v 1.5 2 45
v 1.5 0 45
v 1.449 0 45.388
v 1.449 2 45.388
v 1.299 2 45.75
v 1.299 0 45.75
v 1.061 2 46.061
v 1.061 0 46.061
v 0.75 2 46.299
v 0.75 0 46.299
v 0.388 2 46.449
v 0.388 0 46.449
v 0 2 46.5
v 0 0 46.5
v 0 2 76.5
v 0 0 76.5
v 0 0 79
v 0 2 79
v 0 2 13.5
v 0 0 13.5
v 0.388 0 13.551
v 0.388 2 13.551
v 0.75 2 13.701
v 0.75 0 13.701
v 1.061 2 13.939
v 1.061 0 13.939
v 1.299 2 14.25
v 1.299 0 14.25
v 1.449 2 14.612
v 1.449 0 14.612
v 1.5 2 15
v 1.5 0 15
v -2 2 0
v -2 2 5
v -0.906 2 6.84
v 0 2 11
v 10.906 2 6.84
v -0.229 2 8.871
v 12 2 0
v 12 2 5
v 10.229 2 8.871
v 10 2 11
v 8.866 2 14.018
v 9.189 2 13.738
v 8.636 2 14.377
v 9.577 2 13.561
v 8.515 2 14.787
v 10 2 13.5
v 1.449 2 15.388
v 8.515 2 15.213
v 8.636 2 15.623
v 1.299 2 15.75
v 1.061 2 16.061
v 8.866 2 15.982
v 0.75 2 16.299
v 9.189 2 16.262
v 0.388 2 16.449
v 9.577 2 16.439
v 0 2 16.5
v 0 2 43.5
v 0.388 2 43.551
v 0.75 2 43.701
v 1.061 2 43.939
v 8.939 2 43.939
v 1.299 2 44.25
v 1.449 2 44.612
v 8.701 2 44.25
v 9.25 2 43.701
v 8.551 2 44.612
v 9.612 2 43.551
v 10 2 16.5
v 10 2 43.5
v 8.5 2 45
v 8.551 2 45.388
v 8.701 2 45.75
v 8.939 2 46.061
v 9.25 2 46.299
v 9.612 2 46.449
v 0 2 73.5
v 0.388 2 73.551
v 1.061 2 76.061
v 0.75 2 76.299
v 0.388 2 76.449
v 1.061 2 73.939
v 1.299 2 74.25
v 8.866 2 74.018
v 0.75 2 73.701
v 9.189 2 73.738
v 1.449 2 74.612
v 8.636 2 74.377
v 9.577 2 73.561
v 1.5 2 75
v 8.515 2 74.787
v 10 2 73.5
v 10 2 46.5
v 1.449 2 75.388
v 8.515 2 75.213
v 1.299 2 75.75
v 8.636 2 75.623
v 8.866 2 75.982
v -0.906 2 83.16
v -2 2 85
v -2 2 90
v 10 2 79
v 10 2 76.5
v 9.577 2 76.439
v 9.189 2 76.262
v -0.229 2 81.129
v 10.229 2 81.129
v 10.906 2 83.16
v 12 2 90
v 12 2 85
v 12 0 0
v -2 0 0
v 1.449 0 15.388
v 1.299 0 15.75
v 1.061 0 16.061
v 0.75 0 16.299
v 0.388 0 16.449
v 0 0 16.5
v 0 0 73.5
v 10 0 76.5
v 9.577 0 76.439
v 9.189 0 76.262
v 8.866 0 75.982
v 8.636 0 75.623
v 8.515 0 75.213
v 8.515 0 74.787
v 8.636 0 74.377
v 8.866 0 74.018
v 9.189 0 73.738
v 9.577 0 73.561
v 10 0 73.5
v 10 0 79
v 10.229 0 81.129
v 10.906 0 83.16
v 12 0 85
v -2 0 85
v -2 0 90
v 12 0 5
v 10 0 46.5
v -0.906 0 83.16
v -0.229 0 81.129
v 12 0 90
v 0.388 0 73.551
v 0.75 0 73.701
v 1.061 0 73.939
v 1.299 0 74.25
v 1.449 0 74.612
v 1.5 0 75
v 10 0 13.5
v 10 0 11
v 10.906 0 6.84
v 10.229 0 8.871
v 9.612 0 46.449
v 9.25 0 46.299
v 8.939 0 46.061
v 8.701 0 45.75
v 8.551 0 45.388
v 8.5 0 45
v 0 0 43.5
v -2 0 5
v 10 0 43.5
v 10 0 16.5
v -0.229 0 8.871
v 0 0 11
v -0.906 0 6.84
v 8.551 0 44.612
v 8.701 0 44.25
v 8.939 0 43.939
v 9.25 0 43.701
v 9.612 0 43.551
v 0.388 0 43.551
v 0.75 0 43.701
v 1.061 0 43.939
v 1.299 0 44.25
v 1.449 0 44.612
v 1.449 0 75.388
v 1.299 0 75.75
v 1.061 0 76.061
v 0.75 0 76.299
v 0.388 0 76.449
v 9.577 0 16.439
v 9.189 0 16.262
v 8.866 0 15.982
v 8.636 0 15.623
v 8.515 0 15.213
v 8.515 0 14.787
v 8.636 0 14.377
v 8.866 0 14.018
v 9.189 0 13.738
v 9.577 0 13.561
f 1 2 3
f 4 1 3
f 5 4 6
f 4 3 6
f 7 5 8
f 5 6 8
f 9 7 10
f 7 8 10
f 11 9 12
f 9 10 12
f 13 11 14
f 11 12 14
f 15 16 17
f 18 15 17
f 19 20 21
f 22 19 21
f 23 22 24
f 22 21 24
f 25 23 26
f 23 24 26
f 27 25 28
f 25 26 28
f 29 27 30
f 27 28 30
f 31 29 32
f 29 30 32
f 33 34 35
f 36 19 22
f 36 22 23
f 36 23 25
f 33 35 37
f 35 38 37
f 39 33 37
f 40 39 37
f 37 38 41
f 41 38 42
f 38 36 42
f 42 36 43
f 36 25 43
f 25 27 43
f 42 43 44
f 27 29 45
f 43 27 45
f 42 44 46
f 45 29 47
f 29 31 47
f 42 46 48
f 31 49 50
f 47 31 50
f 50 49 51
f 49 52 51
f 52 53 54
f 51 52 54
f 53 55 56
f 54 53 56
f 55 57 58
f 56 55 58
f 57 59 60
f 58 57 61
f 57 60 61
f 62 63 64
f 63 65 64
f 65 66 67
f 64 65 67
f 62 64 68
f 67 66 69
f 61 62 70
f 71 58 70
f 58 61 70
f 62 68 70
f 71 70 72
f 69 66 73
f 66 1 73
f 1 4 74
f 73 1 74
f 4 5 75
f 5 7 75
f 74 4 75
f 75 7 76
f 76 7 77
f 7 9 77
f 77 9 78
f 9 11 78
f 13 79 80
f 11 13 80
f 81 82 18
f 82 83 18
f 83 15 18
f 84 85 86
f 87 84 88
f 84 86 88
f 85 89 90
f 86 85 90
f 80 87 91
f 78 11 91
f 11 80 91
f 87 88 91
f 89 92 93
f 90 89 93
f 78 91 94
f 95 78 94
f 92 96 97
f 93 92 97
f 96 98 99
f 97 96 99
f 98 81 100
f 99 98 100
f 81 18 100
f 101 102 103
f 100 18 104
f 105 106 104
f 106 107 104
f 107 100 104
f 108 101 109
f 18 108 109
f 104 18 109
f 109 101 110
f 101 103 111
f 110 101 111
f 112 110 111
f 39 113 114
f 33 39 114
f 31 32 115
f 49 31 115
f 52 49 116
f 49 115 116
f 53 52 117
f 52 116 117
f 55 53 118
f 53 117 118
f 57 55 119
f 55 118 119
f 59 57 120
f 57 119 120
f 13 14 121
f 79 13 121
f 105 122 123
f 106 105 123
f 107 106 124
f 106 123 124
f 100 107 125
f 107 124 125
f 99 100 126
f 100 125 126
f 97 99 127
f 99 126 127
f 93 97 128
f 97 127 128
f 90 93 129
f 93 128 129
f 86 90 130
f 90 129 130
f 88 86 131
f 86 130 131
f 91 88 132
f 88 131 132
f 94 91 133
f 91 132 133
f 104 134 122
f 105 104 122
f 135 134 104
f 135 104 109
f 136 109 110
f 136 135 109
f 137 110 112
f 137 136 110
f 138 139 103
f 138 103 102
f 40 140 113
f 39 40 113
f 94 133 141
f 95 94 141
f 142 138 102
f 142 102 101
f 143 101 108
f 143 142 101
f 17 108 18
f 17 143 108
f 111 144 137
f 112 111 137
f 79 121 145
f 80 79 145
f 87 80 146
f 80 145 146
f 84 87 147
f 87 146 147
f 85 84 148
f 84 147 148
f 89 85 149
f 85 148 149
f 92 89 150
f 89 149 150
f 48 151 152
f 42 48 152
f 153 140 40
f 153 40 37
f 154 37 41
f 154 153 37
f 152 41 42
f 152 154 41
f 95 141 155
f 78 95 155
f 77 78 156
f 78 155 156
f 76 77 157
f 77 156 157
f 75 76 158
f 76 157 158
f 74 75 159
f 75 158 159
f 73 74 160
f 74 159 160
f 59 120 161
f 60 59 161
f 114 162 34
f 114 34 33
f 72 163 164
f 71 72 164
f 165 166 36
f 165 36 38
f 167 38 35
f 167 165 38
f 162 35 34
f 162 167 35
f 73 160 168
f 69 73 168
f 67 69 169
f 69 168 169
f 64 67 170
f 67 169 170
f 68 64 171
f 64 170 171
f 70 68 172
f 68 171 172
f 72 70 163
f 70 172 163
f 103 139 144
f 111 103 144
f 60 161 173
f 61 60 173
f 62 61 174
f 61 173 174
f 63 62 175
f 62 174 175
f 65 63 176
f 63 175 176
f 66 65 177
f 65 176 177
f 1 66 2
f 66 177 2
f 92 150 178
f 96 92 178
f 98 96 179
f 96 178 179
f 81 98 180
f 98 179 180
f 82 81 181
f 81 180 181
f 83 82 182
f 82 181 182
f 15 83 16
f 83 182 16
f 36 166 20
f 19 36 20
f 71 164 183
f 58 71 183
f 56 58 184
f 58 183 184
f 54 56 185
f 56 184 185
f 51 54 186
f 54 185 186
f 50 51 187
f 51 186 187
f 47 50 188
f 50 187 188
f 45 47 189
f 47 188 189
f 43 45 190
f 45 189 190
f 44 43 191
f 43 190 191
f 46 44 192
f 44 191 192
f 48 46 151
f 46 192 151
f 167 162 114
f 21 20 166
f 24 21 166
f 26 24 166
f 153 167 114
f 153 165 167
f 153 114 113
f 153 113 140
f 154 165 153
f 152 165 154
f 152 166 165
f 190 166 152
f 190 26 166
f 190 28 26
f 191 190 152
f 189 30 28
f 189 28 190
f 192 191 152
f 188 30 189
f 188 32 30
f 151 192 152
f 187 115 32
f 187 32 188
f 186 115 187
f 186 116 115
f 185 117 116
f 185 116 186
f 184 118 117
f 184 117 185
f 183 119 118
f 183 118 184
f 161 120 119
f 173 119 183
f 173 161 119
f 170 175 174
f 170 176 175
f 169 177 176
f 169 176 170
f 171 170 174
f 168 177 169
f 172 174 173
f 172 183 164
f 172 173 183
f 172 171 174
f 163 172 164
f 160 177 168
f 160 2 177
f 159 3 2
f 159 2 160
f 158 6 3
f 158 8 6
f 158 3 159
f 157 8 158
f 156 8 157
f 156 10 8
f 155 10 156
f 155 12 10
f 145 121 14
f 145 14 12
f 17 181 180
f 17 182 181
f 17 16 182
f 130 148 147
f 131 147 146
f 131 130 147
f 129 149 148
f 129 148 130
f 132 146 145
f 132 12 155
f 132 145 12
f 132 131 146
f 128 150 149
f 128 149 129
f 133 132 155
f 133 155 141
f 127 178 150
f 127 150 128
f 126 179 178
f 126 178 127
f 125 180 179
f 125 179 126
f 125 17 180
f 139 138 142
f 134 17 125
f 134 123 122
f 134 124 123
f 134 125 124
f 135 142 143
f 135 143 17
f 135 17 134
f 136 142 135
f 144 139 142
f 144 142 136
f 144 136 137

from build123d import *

# Parameters (mm, degrees)
SKETCH_1_W      = 2
SKETCH_1_H      = 5
EXTRUDE_1_DEPTH = 2
FILLET_1_R      = 10


with BuildPart() as part:
    # 草图1 → 凸台-拉伸1 (new body)
    with BuildSketch(Plane(origin=(0, 0, 0), x_dir=(1, 0, 0), z_dir=(0, 1, 0))):
        with BuildLine():
            Line((10, 0), (0, 0))
            Line((0, 0), (0, -5))
            Line((0, -5), (0, -13.5))
            ThreePointArc((0, -13.5), (1.060660172, -13.939339828), (1.5, -15))
            ThreePointArc((1.5, -15), (1.060660172, -16.060660172), (0, -16.5))
            Line((0, -16.5), (0, -43.5))
            ThreePointArc((0, -43.5), (1.060660172, -43.939339828), (1.5, -45))
            Line((1.5, -45), (2.5, -45))
            Line((2.5, -45), (2.5, -42.5))
            Line((2.5, -42.5), (7.5, -42.5))
            Line((7.5, -42.5), (7.5, -45))
            Line((7.5, -45), (8.5, -45))
            ThreePointArc((8.5, -45), (8.939339828, -43.939339828), (10, -43.5))
            Line((10, -43.5), (10, -16.5))
            ThreePointArc((10, -16.5), (8.5, -15), (10, -13.5))
            Line((10, -13.5), (10, -5))
            Line((10, -5), (10, 0))
        make_face()
        Polygon((2.5, -42.5), (2.5, -45), (5, -45), (7.5, -45), (7.5, -42.5), align=None)
        Polygon((5, -45), (2.5, -45), (2.5, -47.5), (7.5, -47.5), (7.5, -45), align=None)
        with BuildLine():
            Line((2.5, -45), (1.5, -45))
            ThreePointArc((1.5, -45), (1.060660172, -46.060660172), (0, -46.5))
            Line((0, -46.5), (0, -73.5))
            ThreePointArc((0, -73.5), (1.060660172, -73.939339828), (1.5, -75))
            ThreePointArc((1.5, -75), (1.060660172, -76.060660172), (0, -76.5))
            Line((0, -76.5), (0, -85))
            Line((0, -85), (0, -90))
            Line((0, -90), (10, -90))
            Line((10, -90), (10, -85))
            Line((10, -85), (10, -76.5))
            ThreePointArc((10, -76.5), (8.5, -75), (10, -73.5))
            Line((10, -73.5), (10, -46.5))
            ThreePointArc((10, -46.5), (8.939339828, -46.060660172), (8.5, -45))
            Line((8.5, -45), (7.5, -45))
            Line((7.5, -45), (7.5, -47.5))
            Line((7.5, -47.5), (2.5, -47.5))
            Line((2.5, -47.5), (2.5, -45))
        make_face()
        with Locations((11, -87.5)):
            Rectangle(SKETCH_1_W, SKETCH_1_H)
        with Locations((-1, -87.5)):
            Rectangle(SKETCH_1_W, SKETCH_1_H)
        with Locations((11, -2.5)):
            Rectangle(SKETCH_1_W, SKETCH_1_H)
        with Locations((-1, -2.5)):
            Rectangle(SKETCH_1_W, SKETCH_1_H)
    extrude(amount=EXTRUDE_1_DEPTH)

    # 圆角1
    # the kernel refuses this fillet: 10 mm, written as the material it adds along each edge
    with BuildSketch(Plane(origin=(10, 0, 85), x_dir=(0, 0, -1), z_dir=(0, 1, 0)), Plane(origin=(0, 0, 5), x_dir=(0, 0, 1), z_dir=(0, 1, 0))) as fillet_1_piece_1:
        with BuildLine():
            CenterArc((6, -10), FILLET_1_R, 90, 36.869897646)
            Line((0, -2), (0, 0))
            Line((0, 0), (6, 0))
        make_face()
    extrude(amount=2)
    with BuildSketch(Plane(origin=(0, 0, 85), x_dir=(-1, 0, 0), z_dir=(0, 1, 0)), Plane(origin=(10, 0, 5), x_dir=(1, 0, 0), z_dir=(0, 1, 0))) as fillet_1_piece_2:
        with BuildLine():
            CenterArc((10, -6), FILLET_1_R, 143.130102354, 36.869897646)
            Line((0, -6), (0, 0))
            Line((0, 0), (2, 0))
        make_face()
    extrude(amount=2)


solid = part.part
